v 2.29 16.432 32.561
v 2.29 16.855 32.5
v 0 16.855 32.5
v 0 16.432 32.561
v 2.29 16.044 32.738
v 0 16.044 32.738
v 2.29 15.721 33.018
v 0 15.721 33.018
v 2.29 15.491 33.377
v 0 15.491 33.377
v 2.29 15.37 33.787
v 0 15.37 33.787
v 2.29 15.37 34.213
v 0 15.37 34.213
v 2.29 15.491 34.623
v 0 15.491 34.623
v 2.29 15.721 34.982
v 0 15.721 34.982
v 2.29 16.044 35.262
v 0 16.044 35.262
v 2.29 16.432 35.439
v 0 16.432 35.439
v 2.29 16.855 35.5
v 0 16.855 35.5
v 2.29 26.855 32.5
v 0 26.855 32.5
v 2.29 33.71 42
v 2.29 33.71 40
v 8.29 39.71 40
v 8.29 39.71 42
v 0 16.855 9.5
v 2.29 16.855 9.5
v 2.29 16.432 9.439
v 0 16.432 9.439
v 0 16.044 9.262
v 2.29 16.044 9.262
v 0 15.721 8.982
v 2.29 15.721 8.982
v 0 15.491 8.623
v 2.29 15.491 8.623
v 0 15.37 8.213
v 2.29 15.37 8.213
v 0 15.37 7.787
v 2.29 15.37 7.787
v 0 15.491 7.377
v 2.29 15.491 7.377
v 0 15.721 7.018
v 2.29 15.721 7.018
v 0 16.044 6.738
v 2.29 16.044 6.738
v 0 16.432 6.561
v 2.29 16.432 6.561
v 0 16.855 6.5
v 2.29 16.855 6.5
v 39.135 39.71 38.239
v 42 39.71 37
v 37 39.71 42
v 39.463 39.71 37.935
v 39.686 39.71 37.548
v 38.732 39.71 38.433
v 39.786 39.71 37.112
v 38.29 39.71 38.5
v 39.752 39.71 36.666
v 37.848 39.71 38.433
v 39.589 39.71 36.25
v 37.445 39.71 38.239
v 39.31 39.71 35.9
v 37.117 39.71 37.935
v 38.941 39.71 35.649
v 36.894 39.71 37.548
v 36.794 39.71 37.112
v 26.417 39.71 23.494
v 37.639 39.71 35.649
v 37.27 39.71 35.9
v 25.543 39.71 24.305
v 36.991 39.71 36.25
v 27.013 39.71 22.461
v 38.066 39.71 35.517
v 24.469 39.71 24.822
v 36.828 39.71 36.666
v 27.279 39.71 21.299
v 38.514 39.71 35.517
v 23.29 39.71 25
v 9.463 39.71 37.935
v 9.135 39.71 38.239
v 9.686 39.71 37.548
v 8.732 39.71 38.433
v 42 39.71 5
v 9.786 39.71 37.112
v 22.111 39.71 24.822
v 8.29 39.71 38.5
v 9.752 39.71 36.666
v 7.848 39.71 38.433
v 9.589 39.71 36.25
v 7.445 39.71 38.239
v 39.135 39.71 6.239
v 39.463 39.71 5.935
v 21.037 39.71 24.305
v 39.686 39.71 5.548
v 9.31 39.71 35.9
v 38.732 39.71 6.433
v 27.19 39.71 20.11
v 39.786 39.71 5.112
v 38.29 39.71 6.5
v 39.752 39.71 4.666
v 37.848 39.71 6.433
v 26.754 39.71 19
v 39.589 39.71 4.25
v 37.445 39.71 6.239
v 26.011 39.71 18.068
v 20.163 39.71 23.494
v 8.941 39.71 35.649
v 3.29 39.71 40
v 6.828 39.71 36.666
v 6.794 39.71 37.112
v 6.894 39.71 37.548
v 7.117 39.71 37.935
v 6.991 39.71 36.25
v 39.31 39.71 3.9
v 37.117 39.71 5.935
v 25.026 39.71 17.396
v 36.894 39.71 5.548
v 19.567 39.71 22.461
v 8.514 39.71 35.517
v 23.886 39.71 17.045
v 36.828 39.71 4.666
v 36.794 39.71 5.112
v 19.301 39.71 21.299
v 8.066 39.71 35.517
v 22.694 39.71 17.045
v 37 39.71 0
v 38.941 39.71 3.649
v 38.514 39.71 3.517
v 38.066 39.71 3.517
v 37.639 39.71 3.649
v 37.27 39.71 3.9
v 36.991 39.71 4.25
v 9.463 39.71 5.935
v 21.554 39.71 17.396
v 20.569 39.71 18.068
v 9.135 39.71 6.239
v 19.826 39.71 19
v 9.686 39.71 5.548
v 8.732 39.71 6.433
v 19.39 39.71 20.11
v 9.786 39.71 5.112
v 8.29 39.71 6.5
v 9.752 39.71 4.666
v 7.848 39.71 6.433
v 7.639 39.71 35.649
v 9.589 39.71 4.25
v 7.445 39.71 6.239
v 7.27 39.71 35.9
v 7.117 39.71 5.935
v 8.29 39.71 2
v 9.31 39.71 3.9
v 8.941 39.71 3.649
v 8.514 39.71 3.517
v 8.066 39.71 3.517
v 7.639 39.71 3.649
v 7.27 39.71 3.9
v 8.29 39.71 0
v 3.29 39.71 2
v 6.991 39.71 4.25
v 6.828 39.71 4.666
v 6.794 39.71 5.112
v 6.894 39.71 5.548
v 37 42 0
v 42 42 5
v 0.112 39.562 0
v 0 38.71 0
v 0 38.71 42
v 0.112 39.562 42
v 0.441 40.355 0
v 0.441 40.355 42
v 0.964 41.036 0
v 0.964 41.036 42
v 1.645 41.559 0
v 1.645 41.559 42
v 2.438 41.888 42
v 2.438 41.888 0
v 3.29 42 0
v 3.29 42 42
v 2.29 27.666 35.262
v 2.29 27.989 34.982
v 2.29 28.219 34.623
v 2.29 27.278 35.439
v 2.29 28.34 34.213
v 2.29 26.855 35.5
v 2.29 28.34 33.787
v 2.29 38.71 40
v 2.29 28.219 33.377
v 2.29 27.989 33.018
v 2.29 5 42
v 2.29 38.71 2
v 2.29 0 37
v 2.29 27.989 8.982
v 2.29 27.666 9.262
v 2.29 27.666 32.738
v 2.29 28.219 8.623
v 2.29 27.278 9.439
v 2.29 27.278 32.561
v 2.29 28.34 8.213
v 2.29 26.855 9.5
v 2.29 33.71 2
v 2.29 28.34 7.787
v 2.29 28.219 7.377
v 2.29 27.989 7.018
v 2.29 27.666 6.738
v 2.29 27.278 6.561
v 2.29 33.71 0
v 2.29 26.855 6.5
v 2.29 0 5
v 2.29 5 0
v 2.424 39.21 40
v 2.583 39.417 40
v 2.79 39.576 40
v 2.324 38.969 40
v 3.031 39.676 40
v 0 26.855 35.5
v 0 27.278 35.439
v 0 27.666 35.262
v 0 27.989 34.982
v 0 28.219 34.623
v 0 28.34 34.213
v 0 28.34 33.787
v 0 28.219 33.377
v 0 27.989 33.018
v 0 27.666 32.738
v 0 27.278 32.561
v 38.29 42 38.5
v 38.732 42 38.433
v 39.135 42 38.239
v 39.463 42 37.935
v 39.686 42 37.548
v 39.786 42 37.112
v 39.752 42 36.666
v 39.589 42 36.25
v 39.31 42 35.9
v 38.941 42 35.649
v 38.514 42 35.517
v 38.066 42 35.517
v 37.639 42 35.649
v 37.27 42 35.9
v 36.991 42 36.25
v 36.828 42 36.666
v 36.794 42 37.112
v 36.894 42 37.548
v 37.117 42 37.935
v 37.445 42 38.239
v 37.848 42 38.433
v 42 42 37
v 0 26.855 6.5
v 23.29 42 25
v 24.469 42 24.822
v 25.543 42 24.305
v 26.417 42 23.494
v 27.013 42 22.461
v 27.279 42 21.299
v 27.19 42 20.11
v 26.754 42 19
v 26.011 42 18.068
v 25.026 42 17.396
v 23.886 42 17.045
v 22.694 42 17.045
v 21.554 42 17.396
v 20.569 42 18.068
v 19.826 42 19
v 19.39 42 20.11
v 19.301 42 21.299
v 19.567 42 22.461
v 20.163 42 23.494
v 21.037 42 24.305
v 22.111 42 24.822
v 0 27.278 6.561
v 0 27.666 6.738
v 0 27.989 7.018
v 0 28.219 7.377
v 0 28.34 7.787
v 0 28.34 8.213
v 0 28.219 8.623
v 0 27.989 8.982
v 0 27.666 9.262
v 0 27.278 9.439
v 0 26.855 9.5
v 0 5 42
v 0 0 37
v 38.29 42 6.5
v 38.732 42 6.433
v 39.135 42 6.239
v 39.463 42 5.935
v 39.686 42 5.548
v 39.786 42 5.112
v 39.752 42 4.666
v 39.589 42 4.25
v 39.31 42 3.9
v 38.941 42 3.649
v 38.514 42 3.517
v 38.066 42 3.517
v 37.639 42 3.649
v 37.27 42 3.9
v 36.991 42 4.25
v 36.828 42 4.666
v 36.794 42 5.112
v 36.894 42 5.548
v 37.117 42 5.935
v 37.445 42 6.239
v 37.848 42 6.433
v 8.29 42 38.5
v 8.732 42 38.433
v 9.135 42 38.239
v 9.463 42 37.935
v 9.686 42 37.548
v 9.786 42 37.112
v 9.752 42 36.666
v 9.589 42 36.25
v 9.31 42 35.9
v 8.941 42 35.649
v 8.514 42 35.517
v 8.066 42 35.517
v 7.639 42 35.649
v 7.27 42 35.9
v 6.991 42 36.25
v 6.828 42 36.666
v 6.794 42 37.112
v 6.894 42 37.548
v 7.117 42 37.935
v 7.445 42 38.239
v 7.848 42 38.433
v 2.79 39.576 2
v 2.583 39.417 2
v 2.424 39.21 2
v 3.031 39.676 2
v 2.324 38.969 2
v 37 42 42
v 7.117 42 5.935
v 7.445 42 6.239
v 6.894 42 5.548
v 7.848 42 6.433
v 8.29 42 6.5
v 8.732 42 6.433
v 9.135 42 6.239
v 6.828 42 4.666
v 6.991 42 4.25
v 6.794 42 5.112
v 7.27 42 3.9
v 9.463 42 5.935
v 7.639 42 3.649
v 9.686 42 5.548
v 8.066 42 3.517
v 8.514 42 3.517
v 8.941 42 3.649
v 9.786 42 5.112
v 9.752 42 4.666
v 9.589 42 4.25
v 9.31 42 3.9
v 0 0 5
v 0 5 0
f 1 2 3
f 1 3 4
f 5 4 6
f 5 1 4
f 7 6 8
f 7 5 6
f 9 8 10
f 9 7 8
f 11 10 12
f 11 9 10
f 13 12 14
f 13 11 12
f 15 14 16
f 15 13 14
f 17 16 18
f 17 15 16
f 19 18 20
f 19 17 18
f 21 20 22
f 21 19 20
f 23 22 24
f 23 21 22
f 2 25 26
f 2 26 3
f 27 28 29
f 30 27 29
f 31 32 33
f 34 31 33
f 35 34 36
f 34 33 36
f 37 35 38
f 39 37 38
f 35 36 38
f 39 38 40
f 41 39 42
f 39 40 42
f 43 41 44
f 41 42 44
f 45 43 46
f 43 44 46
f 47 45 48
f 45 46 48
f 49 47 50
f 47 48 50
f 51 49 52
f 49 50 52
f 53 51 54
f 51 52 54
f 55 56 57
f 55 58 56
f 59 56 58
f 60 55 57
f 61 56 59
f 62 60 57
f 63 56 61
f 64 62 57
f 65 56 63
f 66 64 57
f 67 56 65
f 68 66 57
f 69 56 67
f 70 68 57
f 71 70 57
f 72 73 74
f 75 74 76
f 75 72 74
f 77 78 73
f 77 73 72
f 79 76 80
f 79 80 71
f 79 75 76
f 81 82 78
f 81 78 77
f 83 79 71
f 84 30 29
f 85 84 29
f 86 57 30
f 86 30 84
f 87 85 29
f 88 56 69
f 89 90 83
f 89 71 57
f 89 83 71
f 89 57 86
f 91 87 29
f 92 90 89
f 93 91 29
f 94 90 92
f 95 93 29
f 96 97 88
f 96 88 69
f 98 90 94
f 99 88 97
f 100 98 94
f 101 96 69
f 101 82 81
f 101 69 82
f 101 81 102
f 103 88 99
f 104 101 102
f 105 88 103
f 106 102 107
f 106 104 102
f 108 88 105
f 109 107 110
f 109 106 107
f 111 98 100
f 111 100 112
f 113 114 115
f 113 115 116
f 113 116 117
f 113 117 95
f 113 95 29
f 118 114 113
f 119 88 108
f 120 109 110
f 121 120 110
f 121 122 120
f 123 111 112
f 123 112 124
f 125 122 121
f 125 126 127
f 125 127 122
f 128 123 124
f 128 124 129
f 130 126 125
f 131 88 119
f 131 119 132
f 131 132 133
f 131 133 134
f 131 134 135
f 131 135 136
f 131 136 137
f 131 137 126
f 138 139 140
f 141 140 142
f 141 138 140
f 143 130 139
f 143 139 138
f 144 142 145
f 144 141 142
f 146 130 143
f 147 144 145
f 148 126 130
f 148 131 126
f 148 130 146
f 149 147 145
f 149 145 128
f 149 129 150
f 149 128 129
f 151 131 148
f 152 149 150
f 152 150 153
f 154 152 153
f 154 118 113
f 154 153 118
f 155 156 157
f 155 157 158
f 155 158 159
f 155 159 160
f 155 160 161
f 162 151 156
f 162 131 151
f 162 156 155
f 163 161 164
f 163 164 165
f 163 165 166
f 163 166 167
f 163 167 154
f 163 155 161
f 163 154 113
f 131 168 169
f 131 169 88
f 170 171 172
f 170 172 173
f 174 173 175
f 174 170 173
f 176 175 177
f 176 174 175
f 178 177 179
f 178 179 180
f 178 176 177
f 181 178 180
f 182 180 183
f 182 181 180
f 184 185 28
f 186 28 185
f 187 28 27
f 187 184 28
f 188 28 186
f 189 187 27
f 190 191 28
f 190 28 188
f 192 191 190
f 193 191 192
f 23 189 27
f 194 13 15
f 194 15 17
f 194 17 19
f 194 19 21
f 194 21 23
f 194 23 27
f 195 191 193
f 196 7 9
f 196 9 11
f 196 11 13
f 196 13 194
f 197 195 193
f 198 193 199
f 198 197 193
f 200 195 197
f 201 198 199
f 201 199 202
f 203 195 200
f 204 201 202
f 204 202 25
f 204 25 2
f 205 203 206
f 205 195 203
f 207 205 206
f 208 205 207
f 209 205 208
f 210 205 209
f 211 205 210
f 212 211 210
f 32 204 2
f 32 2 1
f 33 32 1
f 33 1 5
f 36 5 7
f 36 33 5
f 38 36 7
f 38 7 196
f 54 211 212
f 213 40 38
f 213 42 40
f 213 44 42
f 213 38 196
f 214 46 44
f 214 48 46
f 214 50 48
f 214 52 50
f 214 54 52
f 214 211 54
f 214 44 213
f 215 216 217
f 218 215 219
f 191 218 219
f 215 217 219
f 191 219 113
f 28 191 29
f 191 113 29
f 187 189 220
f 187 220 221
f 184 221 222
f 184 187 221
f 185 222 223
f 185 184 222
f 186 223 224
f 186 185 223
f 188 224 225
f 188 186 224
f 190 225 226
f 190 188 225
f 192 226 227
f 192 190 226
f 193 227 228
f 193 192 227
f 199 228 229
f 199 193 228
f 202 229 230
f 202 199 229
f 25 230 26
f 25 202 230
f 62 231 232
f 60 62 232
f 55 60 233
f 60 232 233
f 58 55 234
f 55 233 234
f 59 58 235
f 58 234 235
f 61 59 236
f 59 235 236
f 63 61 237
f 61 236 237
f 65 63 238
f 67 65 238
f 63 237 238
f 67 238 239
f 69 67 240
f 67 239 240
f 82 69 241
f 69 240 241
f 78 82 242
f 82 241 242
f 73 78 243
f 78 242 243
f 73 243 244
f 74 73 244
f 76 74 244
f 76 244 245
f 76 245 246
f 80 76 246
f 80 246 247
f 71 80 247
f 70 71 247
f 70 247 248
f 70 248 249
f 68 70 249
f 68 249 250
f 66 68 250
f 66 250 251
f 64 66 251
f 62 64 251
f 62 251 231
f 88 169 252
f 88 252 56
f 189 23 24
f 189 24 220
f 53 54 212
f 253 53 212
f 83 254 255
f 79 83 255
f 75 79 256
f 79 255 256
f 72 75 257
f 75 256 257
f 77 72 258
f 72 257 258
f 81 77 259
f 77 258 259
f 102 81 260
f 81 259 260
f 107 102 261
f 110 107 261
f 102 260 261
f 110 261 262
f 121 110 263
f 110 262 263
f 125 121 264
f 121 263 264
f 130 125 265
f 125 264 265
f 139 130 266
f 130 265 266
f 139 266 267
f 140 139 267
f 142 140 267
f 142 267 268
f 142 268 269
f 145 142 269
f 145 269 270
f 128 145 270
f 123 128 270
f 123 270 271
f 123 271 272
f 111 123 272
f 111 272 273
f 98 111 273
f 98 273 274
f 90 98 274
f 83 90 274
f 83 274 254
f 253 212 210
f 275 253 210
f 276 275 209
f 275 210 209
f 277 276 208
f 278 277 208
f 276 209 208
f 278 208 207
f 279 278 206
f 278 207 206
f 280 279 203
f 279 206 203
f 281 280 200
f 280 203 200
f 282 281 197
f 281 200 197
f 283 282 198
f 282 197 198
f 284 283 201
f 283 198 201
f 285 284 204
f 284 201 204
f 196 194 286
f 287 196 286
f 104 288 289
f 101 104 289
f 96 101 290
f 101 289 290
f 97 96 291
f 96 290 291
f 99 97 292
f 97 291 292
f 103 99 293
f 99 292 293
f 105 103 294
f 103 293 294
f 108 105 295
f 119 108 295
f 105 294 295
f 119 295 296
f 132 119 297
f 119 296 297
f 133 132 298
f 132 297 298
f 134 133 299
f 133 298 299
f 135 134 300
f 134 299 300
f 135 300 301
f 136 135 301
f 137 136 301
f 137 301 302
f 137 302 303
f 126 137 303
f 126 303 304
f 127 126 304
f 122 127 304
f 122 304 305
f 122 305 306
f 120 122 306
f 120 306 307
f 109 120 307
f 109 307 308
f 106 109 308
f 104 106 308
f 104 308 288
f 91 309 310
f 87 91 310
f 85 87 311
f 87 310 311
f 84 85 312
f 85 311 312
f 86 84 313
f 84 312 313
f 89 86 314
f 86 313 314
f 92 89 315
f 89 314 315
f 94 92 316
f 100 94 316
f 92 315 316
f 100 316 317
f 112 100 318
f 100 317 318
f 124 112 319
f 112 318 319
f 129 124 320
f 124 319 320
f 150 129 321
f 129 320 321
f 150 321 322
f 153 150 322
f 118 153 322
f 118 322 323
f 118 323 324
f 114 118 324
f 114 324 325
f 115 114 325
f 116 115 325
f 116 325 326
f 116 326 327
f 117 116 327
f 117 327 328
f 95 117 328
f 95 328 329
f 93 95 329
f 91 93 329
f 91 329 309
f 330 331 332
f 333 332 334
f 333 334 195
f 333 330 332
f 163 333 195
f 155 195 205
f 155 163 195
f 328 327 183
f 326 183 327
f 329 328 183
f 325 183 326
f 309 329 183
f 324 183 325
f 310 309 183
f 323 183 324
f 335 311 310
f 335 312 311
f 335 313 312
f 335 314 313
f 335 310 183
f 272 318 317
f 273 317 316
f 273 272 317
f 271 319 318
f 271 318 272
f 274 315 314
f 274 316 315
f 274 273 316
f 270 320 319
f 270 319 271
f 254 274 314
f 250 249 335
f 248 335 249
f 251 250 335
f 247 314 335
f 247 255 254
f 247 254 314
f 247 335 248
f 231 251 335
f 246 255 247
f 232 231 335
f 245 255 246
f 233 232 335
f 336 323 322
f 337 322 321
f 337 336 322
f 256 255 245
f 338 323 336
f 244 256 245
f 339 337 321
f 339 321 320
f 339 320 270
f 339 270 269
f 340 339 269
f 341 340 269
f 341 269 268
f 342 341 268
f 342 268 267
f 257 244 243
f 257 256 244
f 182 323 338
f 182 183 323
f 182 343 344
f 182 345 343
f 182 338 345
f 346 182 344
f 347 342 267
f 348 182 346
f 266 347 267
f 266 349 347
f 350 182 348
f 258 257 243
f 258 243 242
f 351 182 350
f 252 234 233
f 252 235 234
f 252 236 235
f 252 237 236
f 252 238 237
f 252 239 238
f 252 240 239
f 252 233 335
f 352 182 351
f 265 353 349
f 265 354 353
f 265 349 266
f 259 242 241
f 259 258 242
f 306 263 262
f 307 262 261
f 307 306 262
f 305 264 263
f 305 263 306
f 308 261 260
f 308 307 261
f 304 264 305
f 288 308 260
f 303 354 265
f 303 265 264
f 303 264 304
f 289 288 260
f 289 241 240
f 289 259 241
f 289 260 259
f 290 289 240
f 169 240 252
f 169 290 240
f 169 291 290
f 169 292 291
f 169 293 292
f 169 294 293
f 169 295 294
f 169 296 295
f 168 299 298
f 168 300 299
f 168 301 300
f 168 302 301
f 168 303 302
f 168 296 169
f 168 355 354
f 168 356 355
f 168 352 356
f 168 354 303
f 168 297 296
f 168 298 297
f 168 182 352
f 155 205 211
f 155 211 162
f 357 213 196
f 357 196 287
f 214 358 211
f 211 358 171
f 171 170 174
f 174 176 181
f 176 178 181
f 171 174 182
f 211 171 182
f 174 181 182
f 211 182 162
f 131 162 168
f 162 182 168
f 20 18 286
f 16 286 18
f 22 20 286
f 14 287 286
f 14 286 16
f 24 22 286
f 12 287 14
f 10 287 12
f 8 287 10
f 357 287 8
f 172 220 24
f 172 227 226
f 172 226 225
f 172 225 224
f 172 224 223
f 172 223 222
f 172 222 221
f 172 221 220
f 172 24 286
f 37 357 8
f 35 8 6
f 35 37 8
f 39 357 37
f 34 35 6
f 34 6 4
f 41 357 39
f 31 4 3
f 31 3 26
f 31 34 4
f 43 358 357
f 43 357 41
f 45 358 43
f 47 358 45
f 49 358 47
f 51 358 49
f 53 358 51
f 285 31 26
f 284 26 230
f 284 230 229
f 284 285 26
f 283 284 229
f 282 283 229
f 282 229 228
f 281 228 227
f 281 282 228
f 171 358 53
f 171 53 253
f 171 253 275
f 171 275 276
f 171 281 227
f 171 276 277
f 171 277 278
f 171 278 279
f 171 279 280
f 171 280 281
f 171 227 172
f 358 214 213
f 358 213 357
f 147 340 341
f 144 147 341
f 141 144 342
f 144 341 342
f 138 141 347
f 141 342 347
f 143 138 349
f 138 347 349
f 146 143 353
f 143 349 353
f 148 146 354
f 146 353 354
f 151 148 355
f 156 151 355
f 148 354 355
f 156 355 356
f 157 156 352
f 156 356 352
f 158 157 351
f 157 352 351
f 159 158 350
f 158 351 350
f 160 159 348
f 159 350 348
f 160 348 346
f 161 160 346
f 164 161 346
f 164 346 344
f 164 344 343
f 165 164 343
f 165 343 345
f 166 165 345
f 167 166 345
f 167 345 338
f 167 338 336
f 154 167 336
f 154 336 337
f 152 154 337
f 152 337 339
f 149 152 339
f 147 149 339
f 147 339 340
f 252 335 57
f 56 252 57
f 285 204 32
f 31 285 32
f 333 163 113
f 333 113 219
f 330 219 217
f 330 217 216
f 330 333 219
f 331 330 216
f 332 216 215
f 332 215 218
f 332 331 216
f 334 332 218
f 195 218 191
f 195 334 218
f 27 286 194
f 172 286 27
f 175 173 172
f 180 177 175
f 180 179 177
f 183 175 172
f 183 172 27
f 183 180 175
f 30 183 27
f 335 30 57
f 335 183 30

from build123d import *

# Parameters (mm, degrees)
BRIDA_BASE1_DEPTH       = 42
CHAFL_N1_SIZE           = 5
CORTAR_EXTRUIR1_REACH   = 74.746
CROQUIS6_R              = 1.5
CROQUIS6_R_2            = 4
CORTAR_EXTRUIR2_REACH   = 73.448
SALIENTE_EXTRUIR1_START = -2
SALIENTE_EXTRUIR1_DEPTH = 2


# Sheet-metal steps are written as plain solids
with BuildPart() as part:
    # Croquis1 → Brida base1 (new body)
    with BuildSketch(Plane.XY):
        with BuildLine():
            Line((0, 0), (0, 38.71))
            ThreePointArc((0, 38.71), (0.96361869, 41.03638131), (3.29, 42))
            Line((3.29, 42), (42, 42))
            Line((42, 42), (42, 39.71))
            Line((42, 39.71), (3.29, 39.71))
            ThreePointArc((3.29, 39.71), (2.582893219, 39.417106781), (2.29, 38.71))
            Line((2.29, 38.71), (2.29, 0))
            Line((2.29, 0), (0, 0))
        make_face()
    extrude(amount=BRIDA_BASE1_DEPTH)

    # Chaflán1
    chafl_n1_edges = [part.edges().sort_by_distance(p)[0] for p in [
        (1.145, 0, 42),
        (1.145, 0, 0),
        (42, 40.855, 42),
        (42, 40.855, 0),
    ]]
    chamfer(chafl_n1_edges, length=CHAFL_N1_SIZE)

    # Croquis6 → Cortar-Extruir1 (cut, up to next)
    with BuildSketch(Plane(origin=(0, 42, 0), x_dir=(1, 0, 0), z_dir=(0, 1, 0)), mode=Mode.PRIVATE) as cortar_extruir1_sk1:
        with Locations(Location((8.29, -5, 0), (0, 0, 270))):
            Circle(CROQUIS6_R)
    cortar_extruir1_tool1 = extrude(cortar_extruir1_sk1.sketch, amount=-CORTAR_EXTRUIR1_REACH, mode=Mode.PRIVATE) & part.part
    # Croquis6 → Cortar-Extruir1 (cut, up to next)
    with BuildSketch(Plane(origin=(0, 42, 0), x_dir=(1, 0, 0), z_dir=(0, 1, 0)), mode=Mode.PRIVATE) as cortar_extruir1_sk2:
        with Locations(Location((38.29, -5, 0), (0, 0, 270))):
            Circle(CROQUIS6_R)
    cortar_extruir1_tool2 = extrude(cortar_extruir1_sk2.sketch, amount=-CORTAR_EXTRUIR1_REACH, mode=Mode.PRIVATE) & part.part
    # Croquis6 → Cortar-Extruir1 (cut, up to next)
    with BuildSketch(Plane(origin=(0, 42, 0), x_dir=(1, 0, 0), z_dir=(0, 1, 0)), mode=Mode.PRIVATE) as cortar_extruir1_sk3:
        with Locations(Location((38.29, -37, 0), (0, 0, 270))):
            Circle(CROQUIS6_R)
    cortar_extruir1_tool3 = extrude(cortar_extruir1_sk3.sketch, amount=-CORTAR_EXTRUIR1_REACH, mode=Mode.PRIVATE) & part.part
    # Croquis6 → Cortar-Extruir1 (cut, up to next)
    with BuildSketch(Plane(origin=(0, 42, 0), x_dir=(1, 0, 0), z_dir=(0, 1, 0)), mode=Mode.PRIVATE) as cortar_extruir1_sk4:
        with Locations(Location((8.29, -37, 0), (0, 0, 270))):
            Circle(CROQUIS6_R)
    cortar_extruir1_tool4 = extrude(cortar_extruir1_sk4.sketch, amount=-CORTAR_EXTRUIR1_REACH, mode=Mode.PRIVATE) & part.part
    # Croquis6 → Cortar-Extruir1 (cut, up to next)
    with BuildSketch(Plane(origin=(0, 42, 0), x_dir=(1, 0, 0), z_dir=(0, 1, 0)), mode=Mode.PRIVATE) as cortar_extruir1_sk5:
        with Locations(Location((23.29, -21, 0), (0, 0, 270))):
            Circle(CROQUIS6_R_2)
    cortar_extruir1_tool5 = extrude(cortar_extruir1_sk5.sketch, amount=-CORTAR_EXTRUIR1_REACH, mode=Mode.PRIVATE) & part.part
    add(cortar_extruir1_tool1.solids().sort_by_distance((8.29, 42, 5))[0], mode=Mode.SUBTRACT)
    add(cortar_extruir1_tool2.solids().sort_by_distance((38.29, 42, 5))[0], mode=Mode.SUBTRACT)
    add(cortar_extruir1_tool3.solids().sort_by_distance((38.29, 42, 37))[0], mode=Mode.SUBTRACT)
    add(cortar_extruir1_tool4.solids().sort_by_distance((8.29, 42, 37))[0], mode=Mode.SUBTRACT)
    add(cortar_extruir1_tool5.solids().sort_by_distance((23.29, 42, 21))[0], mode=Mode.SUBTRACT)

    # Croquis7 → Cortar-Extruir2 (cut, up to next)
    with BuildSketch(Plane(origin=(2.29, 0, 0), x_dir=(0, 0, -1), z_dir=(1, 0, 0)), mode=Mode.PRIVATE) as cortar_extruir2_sk1:
        with BuildLine():
            Line((-35.5, 16.855), (-35.5, 26.855))
            ThreePointArc((-35.5, 26.855), (-34, 28.355), (-32.5, 26.855))
            Line((-32.5, 26.855), (-32.5, 16.855))
            ThreePointArc((-32.5, 16.855), (-34, 15.355), (-35.5, 16.855))
        make_face()
    cortar_extruir2_tool1 = extrude(cortar_extruir2_sk1.sketch, amount=-CORTAR_EXTRUIR2_REACH, mode=Mode.PRIVATE) & part.part
    # Croquis7 → Cortar-Extruir2 (cut, up to next)
    with BuildSketch(Plane(origin=(2.29, 0, 0), x_dir=(0, 0, -1), z_dir=(1, 0, 0)), mode=Mode.PRIVATE) as cortar_extruir2_sk2:
        with BuildLine():
            Line((-6.5, 16.855), (-6.5, 26.855))
            ThreePointArc((-6.5, 26.855), (-8, 28.355), (-9.5, 26.855))
            Line((-9.5, 26.855), (-9.5, 16.855))
            ThreePointArc((-9.5, 16.855), (-8, 15.355), (-6.5, 16.855))
        make_face()
    cortar_extruir2_tool2 = extrude(cortar_extruir2_sk2.sketch, amount=-CORTAR_EXTRUIR2_REACH, mode=Mode.PRIVATE) & part.part
    add(cortar_extruir2_tool1.solids().sort_by_distance((2.29, 21.855, 34))[0], mode=Mode.SUBTRACT)
    add(cortar_extruir2_tool2.solids().sort_by_distance((2.29, 21.855, 8))[0], mode=Mode.SUBTRACT)

    # Croquis9 → Saliente-Extruir1 (add)
    with BuildSketch(Plane.XY.offset(42).offset(SALIENTE_EXTRUIR1_START)):
        with BuildLine():
            Line((2.29, 38.71), (2.29, 33.71))
            Line((2.29, 33.71), (8.29, 39.71))
            Line((8.29, 39.71), (3.29, 39.71))
            ThreePointArc((3.29, 39.71), (2.582893219, 39.417106781), (2.29, 38.71))
        make_face()
    saliente_extruir1 = extrude(amount=SALIENTE_EXTRUIR1_DEPTH)

    # Simetría1: Saliente-Extruir1 across plane
    add(saliente_extruir1.mirror(Plane.XY.offset(21)))


solid = part.part
